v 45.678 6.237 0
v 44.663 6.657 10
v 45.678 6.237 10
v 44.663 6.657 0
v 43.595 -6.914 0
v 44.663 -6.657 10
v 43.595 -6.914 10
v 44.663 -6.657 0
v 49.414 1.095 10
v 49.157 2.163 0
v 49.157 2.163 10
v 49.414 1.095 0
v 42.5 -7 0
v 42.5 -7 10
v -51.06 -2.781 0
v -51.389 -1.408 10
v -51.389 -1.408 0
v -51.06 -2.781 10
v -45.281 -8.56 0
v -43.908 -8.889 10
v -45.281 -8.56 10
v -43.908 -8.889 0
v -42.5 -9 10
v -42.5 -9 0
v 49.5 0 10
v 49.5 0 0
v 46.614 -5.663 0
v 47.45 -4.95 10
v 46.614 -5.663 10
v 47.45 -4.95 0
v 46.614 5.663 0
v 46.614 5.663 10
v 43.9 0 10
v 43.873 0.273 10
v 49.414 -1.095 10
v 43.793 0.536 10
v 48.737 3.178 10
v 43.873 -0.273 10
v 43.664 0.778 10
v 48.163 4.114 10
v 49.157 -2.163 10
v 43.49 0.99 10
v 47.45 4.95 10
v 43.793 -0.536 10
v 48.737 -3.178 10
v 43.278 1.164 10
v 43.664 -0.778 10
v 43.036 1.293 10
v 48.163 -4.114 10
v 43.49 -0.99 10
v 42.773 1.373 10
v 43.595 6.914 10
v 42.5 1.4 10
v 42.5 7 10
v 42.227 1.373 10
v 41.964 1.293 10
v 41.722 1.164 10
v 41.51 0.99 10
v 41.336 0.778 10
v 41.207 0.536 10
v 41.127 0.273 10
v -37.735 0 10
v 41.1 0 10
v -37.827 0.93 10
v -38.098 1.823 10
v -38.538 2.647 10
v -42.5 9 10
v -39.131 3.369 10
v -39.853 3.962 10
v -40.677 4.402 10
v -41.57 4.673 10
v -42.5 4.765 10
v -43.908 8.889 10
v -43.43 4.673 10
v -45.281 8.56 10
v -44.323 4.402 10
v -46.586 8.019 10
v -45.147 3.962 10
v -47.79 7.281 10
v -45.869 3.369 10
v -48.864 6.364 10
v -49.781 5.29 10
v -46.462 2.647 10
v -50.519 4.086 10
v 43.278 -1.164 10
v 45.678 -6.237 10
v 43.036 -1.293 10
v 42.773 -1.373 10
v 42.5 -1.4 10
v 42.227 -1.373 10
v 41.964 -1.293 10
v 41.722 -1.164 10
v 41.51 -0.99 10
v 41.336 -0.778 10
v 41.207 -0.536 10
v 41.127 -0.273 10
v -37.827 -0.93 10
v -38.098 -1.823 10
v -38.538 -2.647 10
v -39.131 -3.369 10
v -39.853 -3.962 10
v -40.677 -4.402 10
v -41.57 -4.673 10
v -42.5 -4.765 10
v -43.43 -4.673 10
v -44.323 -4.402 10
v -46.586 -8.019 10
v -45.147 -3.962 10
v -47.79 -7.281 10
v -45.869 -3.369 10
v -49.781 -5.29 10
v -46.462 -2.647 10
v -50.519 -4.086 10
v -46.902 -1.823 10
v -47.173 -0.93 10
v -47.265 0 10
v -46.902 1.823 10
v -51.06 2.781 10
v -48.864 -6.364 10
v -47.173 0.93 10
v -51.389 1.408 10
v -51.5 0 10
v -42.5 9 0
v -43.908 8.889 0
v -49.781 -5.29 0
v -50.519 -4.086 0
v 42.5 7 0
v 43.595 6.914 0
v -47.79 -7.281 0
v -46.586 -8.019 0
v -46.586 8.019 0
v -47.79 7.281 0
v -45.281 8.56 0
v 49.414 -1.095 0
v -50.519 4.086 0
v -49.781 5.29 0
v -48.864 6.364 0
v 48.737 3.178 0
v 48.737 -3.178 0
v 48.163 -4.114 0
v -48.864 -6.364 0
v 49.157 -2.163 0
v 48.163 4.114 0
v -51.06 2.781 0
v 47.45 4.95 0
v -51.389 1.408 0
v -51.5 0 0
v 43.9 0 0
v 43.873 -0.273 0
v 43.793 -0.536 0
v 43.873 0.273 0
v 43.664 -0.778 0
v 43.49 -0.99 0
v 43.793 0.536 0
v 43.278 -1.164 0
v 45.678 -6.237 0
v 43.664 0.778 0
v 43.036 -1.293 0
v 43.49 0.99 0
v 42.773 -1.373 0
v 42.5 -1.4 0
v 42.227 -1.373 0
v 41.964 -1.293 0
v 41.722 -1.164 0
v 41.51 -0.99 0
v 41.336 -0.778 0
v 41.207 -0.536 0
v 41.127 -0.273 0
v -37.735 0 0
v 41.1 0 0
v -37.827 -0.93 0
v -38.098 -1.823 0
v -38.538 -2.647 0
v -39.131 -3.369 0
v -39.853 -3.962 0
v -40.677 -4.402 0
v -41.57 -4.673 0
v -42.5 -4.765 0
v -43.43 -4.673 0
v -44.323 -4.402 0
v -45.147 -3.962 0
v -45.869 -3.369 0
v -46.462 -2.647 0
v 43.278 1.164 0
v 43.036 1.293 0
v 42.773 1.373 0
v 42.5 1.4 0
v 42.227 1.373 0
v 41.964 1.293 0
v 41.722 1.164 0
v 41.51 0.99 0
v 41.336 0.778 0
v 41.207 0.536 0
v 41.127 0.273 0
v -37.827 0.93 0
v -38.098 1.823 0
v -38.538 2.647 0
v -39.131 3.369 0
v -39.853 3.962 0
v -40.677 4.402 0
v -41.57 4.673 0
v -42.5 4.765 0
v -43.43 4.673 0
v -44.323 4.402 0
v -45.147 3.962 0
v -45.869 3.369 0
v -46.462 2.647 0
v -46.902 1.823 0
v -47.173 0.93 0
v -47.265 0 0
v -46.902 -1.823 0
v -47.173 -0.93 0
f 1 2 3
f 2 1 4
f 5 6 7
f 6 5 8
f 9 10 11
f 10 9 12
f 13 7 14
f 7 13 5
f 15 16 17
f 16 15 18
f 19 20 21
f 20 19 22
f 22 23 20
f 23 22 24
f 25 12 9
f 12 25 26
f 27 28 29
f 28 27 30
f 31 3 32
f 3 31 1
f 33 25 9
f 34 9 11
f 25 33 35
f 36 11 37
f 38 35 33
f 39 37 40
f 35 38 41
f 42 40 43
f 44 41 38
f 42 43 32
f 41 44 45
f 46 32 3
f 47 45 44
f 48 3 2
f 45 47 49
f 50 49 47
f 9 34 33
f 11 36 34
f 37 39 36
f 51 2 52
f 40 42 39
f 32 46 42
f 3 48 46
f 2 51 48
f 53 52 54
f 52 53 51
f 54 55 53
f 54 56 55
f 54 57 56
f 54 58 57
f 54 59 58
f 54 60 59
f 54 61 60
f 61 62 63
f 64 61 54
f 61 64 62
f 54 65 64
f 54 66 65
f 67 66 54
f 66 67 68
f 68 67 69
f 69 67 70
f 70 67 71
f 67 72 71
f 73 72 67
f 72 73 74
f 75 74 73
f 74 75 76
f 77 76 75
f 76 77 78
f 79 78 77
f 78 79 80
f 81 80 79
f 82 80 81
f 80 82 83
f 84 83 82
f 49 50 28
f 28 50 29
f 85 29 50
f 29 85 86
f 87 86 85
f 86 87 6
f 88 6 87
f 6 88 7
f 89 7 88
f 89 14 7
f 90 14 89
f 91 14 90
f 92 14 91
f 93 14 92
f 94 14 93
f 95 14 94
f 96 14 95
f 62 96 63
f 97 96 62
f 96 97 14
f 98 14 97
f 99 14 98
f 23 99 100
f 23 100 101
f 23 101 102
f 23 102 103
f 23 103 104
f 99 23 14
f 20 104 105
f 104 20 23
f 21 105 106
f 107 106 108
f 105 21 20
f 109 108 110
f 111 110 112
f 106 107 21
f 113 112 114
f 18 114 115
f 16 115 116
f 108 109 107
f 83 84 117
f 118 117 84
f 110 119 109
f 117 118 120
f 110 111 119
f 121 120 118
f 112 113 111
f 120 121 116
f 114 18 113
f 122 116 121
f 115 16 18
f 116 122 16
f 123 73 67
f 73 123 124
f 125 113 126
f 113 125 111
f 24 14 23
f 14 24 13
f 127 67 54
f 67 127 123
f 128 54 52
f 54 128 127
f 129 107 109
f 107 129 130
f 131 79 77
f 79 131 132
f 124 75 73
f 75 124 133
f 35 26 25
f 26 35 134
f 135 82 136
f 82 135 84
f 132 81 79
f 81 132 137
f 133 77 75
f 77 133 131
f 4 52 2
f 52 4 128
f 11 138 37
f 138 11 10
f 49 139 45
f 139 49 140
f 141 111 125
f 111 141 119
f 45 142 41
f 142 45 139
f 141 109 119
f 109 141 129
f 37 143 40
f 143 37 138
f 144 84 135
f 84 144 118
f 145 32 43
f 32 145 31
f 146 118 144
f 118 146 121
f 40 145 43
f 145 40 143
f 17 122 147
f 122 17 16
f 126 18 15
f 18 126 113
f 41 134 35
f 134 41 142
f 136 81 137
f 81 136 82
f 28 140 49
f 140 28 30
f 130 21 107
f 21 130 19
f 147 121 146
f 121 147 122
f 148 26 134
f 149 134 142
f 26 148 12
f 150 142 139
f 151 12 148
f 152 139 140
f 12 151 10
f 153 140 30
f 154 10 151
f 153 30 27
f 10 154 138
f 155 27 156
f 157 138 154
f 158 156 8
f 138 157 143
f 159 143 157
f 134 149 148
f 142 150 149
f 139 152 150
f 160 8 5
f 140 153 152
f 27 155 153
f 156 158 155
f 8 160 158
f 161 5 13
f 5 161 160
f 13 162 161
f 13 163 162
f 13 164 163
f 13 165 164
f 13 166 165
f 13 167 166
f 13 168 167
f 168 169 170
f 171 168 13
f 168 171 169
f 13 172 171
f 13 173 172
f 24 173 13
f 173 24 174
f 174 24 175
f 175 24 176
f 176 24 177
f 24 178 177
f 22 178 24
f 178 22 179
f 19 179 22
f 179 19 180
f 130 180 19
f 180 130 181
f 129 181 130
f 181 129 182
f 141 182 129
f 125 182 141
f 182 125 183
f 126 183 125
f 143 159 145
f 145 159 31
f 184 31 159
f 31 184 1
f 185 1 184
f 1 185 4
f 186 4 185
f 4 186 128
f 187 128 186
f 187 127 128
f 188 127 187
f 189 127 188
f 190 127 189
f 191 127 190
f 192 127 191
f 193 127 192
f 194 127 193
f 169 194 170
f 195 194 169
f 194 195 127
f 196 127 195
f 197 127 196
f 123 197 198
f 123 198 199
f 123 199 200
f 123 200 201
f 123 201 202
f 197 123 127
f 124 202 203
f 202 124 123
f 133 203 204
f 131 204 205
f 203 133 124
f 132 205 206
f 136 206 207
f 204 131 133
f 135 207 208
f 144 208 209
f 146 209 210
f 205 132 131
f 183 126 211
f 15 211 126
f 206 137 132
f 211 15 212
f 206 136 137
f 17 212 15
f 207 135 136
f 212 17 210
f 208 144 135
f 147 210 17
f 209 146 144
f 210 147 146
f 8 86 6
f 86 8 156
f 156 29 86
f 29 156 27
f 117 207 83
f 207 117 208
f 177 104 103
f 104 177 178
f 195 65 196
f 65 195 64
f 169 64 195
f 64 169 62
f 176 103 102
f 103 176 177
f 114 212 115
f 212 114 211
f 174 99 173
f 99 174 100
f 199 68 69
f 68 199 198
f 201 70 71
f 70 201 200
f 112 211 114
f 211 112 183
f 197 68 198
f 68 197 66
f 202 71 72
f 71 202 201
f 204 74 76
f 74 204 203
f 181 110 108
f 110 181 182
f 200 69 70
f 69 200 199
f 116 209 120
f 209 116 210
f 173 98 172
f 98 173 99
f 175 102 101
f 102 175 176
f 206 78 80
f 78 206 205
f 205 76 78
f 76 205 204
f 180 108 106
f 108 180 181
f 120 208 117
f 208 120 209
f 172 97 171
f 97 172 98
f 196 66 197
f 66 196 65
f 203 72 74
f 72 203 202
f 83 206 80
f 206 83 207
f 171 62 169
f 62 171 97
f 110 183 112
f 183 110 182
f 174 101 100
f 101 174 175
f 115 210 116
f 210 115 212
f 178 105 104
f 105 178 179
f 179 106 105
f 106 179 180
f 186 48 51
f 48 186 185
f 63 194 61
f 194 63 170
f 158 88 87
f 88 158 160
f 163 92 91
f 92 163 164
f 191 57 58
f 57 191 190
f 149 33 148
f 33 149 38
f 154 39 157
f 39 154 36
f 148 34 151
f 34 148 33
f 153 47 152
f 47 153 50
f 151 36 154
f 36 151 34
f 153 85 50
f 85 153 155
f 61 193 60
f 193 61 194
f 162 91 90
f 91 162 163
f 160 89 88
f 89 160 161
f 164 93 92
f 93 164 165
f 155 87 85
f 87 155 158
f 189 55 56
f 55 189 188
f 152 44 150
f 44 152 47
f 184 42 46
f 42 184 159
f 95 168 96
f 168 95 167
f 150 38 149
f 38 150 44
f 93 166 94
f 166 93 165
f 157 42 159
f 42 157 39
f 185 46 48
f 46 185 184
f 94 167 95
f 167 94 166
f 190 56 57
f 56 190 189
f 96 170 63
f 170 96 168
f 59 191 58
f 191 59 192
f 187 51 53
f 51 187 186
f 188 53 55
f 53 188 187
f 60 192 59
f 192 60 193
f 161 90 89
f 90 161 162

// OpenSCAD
$fn = 32;

// ----------------------------------------------------------------------
// Lever: 85 mm between the bosses, 10 mm thick, smooth outline
// ----------------------------------------------------------------------

// --- parameters (mm) ---
lever_l = 85;             // distance between the boss centres
boss_a = 18;              // first boss diameter
boss_b = 14;              // second boss diameter
bore_a = 9.53;            // first bore
bore_b = 2.8;             // second bore
lever_t = 10;             // lever thickness

lever_profile = [[-51.5, 0], [-51.389, -1.408], [-51.06, -2.781], [-50.519, -4.086], [-49.781, -5.29], [-48.864, -6.364], [-47.79, -7.281], [-46.586, -8.019], [-45.281, -8.56], [-43.908, -8.889], [-42.5, -9], [42.5, -7], [43.595, -6.914], [44.663, -6.657], [45.678, -6.237], [46.614, -5.663], [47.45, -4.95], [48.163, -4.114], [48.737, -3.178], [49.157, -2.163], [49.414, -1.095], [49.5, 0], [49.414, 1.095], [49.157, 2.163], [48.737, 3.178], [48.163, 4.114], [47.45, 4.95], [46.614, 5.663], [45.678, 6.237], [44.663, 6.657], [43.595, 6.914], [42.5, 7], [-42.5, 9], [-43.908, 8.889], [-45.281, 8.56], [-46.586, 8.019], [-47.79, 7.281], [-48.864, 6.364], [-49.781, 5.29], [-50.519, 4.086], [-51.06, 2.781], [-51.389, 1.408]];

difference() {
  linear_extrude(height = lever_t) polygon(lever_profile);
  translate([-42.5, 0, -2.5]) cylinder(h = lever_t + 5, d = bore_a);
  translate([42.5, 0, -2.5]) cylinder(h = lever_t + 5, d = bore_b);
}
